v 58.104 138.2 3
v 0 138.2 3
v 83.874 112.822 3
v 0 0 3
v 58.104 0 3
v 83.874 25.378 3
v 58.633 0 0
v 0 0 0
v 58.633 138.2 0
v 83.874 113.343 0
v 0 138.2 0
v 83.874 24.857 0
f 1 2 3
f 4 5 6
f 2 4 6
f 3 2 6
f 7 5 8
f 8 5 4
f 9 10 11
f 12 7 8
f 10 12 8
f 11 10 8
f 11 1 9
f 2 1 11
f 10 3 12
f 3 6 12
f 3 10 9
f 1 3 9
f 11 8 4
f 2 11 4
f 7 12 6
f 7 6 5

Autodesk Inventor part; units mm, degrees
ref_plane "YZ Plane" through (0, 0, 0) normal (1, 0, 0) x (0, 1, 0)
ref_plane "XZ Plane" through (0, 0, 0) normal (0, 1, 0) x (-1, 0, 0)
ref_plane "XY Plane" through (0, 0, 0) normal (0, 0, 1) x (1, 0, 0)
sketch "Esboço1" plane through (0, 0, 0) normal (0, 1, 0) x (-1, 0, 0)
  line L0 (-83.8742, 0) -> (0, 0)
  line L1 (0, 0) -> (0, 3)
  line L2 (0, 3) -> (-83.8742, 3)
  line L3 (-83.8742, 3) -> (-83.8742, 0)
  dimension "d0" = 3
extrude "Extrusão1" add sketch "Esboço1" along normal blind 138.2
ref_plane "Plano de trabalho1" through (83.8742, 109.1, 0) normal (-0.1736, 0, 0.9848) x (0, -1, 0)
sketch "Esboço2" plane through (83.8742, 109.1, 0) normal (-0.1736, 0, 0.9848) x (0, -1, 0)
  line L0 (0.8787, 5.1213) -> (-31.2213, -26.9787)
  line L1 (79.1213, 5.1213) -> (111.2213, -26.9787)
  line L2 (120.2426, -26.2032) -> (-42, -26.2032)
  line L3 (-42, -26.2032) -> (-42, 2.623)
  line L4 (-42, 2.623) -> (120.2426, 2.623)
  line L5 (120.2426, 2.623) -> (120.2426, -26.2032)
  point P0 (109.1, -82.6)
  point P1 (-30.4458, -26.2032)
  point P2 (-1.6196, 2.623)
  point P3 (81.6196, 2.623)
  point P4 (110.4458, -26.2032)
extrude "Extrusão2" cut sketch "Esboço2" along normal blind 13.7 contours L0 L2 L3 L4 | L4 L5 L2 L1
properties part number "tampa"
